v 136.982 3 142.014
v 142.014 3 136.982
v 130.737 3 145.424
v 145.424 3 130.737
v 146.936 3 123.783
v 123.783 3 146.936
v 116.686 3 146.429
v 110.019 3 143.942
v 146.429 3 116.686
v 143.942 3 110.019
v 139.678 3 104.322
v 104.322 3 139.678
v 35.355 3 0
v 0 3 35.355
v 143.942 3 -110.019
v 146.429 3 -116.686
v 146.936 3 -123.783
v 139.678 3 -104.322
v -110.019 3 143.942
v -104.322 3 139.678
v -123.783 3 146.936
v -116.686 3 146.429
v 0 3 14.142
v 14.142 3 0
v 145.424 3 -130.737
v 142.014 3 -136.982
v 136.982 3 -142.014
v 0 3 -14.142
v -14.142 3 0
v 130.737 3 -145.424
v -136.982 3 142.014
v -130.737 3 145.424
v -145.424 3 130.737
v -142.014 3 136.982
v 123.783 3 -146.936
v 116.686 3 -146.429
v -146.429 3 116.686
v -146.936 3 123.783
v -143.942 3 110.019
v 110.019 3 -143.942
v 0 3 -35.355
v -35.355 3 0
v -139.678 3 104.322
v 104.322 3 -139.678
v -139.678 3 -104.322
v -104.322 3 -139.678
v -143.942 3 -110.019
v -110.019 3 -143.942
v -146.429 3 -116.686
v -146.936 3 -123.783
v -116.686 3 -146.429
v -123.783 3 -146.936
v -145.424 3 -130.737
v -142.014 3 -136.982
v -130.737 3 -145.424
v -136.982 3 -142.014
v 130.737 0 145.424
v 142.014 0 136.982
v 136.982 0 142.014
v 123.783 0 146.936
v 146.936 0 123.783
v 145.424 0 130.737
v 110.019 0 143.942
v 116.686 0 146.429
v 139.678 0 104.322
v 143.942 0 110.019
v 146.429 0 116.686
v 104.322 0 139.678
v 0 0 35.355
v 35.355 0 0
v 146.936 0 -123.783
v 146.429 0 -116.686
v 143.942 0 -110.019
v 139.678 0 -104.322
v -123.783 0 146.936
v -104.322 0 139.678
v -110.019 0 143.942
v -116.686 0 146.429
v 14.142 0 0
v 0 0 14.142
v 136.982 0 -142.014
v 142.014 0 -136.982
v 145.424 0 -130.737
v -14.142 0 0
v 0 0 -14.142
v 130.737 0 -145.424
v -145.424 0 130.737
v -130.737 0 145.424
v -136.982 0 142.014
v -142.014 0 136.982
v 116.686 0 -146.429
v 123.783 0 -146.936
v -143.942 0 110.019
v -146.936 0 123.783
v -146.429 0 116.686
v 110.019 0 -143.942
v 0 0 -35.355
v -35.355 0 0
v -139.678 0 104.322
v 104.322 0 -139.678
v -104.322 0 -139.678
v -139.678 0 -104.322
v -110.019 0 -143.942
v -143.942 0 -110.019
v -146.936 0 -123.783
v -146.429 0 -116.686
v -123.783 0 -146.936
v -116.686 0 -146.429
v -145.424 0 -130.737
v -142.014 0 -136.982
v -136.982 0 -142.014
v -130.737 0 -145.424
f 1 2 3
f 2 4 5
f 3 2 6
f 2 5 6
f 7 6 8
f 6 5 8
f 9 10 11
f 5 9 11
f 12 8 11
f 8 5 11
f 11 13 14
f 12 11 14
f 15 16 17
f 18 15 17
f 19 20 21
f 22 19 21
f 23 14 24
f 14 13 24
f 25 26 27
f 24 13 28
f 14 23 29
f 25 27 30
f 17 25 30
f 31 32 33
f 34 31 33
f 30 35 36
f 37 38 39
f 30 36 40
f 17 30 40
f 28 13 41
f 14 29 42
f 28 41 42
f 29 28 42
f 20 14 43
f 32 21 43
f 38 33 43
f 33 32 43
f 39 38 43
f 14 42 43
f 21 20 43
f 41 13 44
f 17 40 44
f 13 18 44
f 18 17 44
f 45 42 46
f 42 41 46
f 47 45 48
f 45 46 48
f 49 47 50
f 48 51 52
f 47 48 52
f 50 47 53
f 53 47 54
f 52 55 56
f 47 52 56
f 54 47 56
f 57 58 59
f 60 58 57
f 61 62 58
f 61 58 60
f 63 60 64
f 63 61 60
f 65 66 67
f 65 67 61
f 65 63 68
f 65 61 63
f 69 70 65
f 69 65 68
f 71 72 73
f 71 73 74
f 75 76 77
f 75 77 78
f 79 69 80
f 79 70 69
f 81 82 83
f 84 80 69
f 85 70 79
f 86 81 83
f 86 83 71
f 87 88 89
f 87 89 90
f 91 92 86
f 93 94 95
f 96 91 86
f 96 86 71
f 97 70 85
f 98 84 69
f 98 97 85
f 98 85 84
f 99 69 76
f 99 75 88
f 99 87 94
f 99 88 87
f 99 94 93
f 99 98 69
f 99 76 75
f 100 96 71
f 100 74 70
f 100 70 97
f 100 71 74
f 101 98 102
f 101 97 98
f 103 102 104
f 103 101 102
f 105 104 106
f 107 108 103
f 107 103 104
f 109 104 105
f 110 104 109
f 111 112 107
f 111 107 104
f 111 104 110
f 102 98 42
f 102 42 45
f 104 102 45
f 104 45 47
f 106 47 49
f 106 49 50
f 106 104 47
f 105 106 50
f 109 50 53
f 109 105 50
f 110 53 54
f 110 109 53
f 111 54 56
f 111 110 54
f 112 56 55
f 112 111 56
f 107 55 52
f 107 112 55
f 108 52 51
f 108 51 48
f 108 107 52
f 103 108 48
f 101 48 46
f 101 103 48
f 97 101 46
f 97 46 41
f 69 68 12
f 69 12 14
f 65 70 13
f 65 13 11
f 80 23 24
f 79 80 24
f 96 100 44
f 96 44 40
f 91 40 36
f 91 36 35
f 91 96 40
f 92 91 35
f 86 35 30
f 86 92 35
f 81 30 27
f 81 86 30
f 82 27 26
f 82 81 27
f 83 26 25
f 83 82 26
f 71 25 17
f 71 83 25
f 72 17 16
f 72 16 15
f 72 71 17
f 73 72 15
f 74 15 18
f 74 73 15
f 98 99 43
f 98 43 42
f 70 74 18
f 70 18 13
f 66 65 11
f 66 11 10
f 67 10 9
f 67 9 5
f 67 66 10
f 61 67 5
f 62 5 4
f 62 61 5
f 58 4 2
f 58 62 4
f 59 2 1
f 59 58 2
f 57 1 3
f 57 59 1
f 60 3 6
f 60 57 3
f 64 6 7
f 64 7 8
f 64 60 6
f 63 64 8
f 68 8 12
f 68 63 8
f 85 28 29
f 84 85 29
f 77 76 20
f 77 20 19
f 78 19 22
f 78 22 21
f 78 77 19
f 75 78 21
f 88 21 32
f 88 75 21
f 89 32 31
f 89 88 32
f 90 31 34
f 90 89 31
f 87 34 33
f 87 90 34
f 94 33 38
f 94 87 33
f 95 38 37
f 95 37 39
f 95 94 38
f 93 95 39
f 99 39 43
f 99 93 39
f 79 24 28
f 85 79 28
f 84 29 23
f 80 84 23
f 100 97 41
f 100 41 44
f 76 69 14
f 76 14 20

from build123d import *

# Parameters (mm, degrees)
BOSS_EXTRUDE2_DEPTH = 3
CUT_EXTRUDE2_DEPTH  = 5


with BuildPart() as part:
    # Sketch2 → Boss-Extrude2 (new body)
    with BuildSketch(Plane(origin=(0, 0, 0), x_dir=(1, 0, 0), z_dir=(0, 1, 0))):
        with BuildLine():
            Line((104.32233047, -139.67766953), (0, -35.355339059))
            Line((0, -35.355339059), (-104.32233047, -139.67766953))
            ThreePointArc((-104.32233047, -139.67766953), (-139.67766953, -139.67766953), (-139.67766953, -104.32233047))
            Line((-139.67766953, -104.32233047), (-35.355339059, 0))
            Line((-35.355339059, 0), (-139.67766953, 104.32233047))
            ThreePointArc((-139.67766953, 104.32233047), (-139.67766953, 139.67766953), (-104.32233047, 139.67766953))
            Line((-104.32233047, 139.67766953), (0, 35.355339059))
            Line((0, 35.355339059), (104.32233047, 139.67766953))
            ThreePointArc((104.32233047, 139.67766953), (139.67766953, 139.67766953), (139.67766953, 104.32233047))
            Line((139.67766953, 104.32233047), (35.355339059, 0))
            Line((35.355339059, 0), (139.67766953, -104.32233047))
            ThreePointArc((139.67766953, -104.32233047), (139.67766953, -139.67766953), (104.32233047, -139.67766953))
        make_face()
    extrude(amount=BOSS_EXTRUDE2_DEPTH)

    # Sketch6 → Cut-Extrude2 (cut)
    with BuildSketch(Plane(origin=(0, 3, 0), x_dir=(1, 0, 0), z_dir=(0, 1, 0))):
        Polygon((0, -14.142135624), (14.142135624, 0), (0, 14.142135624), (-14.142135624, 0), align=None)
    extrude(amount=-CUT_EXTRUDE2_DEPTH, mode=Mode.SUBTRACT)


solid = part.part
